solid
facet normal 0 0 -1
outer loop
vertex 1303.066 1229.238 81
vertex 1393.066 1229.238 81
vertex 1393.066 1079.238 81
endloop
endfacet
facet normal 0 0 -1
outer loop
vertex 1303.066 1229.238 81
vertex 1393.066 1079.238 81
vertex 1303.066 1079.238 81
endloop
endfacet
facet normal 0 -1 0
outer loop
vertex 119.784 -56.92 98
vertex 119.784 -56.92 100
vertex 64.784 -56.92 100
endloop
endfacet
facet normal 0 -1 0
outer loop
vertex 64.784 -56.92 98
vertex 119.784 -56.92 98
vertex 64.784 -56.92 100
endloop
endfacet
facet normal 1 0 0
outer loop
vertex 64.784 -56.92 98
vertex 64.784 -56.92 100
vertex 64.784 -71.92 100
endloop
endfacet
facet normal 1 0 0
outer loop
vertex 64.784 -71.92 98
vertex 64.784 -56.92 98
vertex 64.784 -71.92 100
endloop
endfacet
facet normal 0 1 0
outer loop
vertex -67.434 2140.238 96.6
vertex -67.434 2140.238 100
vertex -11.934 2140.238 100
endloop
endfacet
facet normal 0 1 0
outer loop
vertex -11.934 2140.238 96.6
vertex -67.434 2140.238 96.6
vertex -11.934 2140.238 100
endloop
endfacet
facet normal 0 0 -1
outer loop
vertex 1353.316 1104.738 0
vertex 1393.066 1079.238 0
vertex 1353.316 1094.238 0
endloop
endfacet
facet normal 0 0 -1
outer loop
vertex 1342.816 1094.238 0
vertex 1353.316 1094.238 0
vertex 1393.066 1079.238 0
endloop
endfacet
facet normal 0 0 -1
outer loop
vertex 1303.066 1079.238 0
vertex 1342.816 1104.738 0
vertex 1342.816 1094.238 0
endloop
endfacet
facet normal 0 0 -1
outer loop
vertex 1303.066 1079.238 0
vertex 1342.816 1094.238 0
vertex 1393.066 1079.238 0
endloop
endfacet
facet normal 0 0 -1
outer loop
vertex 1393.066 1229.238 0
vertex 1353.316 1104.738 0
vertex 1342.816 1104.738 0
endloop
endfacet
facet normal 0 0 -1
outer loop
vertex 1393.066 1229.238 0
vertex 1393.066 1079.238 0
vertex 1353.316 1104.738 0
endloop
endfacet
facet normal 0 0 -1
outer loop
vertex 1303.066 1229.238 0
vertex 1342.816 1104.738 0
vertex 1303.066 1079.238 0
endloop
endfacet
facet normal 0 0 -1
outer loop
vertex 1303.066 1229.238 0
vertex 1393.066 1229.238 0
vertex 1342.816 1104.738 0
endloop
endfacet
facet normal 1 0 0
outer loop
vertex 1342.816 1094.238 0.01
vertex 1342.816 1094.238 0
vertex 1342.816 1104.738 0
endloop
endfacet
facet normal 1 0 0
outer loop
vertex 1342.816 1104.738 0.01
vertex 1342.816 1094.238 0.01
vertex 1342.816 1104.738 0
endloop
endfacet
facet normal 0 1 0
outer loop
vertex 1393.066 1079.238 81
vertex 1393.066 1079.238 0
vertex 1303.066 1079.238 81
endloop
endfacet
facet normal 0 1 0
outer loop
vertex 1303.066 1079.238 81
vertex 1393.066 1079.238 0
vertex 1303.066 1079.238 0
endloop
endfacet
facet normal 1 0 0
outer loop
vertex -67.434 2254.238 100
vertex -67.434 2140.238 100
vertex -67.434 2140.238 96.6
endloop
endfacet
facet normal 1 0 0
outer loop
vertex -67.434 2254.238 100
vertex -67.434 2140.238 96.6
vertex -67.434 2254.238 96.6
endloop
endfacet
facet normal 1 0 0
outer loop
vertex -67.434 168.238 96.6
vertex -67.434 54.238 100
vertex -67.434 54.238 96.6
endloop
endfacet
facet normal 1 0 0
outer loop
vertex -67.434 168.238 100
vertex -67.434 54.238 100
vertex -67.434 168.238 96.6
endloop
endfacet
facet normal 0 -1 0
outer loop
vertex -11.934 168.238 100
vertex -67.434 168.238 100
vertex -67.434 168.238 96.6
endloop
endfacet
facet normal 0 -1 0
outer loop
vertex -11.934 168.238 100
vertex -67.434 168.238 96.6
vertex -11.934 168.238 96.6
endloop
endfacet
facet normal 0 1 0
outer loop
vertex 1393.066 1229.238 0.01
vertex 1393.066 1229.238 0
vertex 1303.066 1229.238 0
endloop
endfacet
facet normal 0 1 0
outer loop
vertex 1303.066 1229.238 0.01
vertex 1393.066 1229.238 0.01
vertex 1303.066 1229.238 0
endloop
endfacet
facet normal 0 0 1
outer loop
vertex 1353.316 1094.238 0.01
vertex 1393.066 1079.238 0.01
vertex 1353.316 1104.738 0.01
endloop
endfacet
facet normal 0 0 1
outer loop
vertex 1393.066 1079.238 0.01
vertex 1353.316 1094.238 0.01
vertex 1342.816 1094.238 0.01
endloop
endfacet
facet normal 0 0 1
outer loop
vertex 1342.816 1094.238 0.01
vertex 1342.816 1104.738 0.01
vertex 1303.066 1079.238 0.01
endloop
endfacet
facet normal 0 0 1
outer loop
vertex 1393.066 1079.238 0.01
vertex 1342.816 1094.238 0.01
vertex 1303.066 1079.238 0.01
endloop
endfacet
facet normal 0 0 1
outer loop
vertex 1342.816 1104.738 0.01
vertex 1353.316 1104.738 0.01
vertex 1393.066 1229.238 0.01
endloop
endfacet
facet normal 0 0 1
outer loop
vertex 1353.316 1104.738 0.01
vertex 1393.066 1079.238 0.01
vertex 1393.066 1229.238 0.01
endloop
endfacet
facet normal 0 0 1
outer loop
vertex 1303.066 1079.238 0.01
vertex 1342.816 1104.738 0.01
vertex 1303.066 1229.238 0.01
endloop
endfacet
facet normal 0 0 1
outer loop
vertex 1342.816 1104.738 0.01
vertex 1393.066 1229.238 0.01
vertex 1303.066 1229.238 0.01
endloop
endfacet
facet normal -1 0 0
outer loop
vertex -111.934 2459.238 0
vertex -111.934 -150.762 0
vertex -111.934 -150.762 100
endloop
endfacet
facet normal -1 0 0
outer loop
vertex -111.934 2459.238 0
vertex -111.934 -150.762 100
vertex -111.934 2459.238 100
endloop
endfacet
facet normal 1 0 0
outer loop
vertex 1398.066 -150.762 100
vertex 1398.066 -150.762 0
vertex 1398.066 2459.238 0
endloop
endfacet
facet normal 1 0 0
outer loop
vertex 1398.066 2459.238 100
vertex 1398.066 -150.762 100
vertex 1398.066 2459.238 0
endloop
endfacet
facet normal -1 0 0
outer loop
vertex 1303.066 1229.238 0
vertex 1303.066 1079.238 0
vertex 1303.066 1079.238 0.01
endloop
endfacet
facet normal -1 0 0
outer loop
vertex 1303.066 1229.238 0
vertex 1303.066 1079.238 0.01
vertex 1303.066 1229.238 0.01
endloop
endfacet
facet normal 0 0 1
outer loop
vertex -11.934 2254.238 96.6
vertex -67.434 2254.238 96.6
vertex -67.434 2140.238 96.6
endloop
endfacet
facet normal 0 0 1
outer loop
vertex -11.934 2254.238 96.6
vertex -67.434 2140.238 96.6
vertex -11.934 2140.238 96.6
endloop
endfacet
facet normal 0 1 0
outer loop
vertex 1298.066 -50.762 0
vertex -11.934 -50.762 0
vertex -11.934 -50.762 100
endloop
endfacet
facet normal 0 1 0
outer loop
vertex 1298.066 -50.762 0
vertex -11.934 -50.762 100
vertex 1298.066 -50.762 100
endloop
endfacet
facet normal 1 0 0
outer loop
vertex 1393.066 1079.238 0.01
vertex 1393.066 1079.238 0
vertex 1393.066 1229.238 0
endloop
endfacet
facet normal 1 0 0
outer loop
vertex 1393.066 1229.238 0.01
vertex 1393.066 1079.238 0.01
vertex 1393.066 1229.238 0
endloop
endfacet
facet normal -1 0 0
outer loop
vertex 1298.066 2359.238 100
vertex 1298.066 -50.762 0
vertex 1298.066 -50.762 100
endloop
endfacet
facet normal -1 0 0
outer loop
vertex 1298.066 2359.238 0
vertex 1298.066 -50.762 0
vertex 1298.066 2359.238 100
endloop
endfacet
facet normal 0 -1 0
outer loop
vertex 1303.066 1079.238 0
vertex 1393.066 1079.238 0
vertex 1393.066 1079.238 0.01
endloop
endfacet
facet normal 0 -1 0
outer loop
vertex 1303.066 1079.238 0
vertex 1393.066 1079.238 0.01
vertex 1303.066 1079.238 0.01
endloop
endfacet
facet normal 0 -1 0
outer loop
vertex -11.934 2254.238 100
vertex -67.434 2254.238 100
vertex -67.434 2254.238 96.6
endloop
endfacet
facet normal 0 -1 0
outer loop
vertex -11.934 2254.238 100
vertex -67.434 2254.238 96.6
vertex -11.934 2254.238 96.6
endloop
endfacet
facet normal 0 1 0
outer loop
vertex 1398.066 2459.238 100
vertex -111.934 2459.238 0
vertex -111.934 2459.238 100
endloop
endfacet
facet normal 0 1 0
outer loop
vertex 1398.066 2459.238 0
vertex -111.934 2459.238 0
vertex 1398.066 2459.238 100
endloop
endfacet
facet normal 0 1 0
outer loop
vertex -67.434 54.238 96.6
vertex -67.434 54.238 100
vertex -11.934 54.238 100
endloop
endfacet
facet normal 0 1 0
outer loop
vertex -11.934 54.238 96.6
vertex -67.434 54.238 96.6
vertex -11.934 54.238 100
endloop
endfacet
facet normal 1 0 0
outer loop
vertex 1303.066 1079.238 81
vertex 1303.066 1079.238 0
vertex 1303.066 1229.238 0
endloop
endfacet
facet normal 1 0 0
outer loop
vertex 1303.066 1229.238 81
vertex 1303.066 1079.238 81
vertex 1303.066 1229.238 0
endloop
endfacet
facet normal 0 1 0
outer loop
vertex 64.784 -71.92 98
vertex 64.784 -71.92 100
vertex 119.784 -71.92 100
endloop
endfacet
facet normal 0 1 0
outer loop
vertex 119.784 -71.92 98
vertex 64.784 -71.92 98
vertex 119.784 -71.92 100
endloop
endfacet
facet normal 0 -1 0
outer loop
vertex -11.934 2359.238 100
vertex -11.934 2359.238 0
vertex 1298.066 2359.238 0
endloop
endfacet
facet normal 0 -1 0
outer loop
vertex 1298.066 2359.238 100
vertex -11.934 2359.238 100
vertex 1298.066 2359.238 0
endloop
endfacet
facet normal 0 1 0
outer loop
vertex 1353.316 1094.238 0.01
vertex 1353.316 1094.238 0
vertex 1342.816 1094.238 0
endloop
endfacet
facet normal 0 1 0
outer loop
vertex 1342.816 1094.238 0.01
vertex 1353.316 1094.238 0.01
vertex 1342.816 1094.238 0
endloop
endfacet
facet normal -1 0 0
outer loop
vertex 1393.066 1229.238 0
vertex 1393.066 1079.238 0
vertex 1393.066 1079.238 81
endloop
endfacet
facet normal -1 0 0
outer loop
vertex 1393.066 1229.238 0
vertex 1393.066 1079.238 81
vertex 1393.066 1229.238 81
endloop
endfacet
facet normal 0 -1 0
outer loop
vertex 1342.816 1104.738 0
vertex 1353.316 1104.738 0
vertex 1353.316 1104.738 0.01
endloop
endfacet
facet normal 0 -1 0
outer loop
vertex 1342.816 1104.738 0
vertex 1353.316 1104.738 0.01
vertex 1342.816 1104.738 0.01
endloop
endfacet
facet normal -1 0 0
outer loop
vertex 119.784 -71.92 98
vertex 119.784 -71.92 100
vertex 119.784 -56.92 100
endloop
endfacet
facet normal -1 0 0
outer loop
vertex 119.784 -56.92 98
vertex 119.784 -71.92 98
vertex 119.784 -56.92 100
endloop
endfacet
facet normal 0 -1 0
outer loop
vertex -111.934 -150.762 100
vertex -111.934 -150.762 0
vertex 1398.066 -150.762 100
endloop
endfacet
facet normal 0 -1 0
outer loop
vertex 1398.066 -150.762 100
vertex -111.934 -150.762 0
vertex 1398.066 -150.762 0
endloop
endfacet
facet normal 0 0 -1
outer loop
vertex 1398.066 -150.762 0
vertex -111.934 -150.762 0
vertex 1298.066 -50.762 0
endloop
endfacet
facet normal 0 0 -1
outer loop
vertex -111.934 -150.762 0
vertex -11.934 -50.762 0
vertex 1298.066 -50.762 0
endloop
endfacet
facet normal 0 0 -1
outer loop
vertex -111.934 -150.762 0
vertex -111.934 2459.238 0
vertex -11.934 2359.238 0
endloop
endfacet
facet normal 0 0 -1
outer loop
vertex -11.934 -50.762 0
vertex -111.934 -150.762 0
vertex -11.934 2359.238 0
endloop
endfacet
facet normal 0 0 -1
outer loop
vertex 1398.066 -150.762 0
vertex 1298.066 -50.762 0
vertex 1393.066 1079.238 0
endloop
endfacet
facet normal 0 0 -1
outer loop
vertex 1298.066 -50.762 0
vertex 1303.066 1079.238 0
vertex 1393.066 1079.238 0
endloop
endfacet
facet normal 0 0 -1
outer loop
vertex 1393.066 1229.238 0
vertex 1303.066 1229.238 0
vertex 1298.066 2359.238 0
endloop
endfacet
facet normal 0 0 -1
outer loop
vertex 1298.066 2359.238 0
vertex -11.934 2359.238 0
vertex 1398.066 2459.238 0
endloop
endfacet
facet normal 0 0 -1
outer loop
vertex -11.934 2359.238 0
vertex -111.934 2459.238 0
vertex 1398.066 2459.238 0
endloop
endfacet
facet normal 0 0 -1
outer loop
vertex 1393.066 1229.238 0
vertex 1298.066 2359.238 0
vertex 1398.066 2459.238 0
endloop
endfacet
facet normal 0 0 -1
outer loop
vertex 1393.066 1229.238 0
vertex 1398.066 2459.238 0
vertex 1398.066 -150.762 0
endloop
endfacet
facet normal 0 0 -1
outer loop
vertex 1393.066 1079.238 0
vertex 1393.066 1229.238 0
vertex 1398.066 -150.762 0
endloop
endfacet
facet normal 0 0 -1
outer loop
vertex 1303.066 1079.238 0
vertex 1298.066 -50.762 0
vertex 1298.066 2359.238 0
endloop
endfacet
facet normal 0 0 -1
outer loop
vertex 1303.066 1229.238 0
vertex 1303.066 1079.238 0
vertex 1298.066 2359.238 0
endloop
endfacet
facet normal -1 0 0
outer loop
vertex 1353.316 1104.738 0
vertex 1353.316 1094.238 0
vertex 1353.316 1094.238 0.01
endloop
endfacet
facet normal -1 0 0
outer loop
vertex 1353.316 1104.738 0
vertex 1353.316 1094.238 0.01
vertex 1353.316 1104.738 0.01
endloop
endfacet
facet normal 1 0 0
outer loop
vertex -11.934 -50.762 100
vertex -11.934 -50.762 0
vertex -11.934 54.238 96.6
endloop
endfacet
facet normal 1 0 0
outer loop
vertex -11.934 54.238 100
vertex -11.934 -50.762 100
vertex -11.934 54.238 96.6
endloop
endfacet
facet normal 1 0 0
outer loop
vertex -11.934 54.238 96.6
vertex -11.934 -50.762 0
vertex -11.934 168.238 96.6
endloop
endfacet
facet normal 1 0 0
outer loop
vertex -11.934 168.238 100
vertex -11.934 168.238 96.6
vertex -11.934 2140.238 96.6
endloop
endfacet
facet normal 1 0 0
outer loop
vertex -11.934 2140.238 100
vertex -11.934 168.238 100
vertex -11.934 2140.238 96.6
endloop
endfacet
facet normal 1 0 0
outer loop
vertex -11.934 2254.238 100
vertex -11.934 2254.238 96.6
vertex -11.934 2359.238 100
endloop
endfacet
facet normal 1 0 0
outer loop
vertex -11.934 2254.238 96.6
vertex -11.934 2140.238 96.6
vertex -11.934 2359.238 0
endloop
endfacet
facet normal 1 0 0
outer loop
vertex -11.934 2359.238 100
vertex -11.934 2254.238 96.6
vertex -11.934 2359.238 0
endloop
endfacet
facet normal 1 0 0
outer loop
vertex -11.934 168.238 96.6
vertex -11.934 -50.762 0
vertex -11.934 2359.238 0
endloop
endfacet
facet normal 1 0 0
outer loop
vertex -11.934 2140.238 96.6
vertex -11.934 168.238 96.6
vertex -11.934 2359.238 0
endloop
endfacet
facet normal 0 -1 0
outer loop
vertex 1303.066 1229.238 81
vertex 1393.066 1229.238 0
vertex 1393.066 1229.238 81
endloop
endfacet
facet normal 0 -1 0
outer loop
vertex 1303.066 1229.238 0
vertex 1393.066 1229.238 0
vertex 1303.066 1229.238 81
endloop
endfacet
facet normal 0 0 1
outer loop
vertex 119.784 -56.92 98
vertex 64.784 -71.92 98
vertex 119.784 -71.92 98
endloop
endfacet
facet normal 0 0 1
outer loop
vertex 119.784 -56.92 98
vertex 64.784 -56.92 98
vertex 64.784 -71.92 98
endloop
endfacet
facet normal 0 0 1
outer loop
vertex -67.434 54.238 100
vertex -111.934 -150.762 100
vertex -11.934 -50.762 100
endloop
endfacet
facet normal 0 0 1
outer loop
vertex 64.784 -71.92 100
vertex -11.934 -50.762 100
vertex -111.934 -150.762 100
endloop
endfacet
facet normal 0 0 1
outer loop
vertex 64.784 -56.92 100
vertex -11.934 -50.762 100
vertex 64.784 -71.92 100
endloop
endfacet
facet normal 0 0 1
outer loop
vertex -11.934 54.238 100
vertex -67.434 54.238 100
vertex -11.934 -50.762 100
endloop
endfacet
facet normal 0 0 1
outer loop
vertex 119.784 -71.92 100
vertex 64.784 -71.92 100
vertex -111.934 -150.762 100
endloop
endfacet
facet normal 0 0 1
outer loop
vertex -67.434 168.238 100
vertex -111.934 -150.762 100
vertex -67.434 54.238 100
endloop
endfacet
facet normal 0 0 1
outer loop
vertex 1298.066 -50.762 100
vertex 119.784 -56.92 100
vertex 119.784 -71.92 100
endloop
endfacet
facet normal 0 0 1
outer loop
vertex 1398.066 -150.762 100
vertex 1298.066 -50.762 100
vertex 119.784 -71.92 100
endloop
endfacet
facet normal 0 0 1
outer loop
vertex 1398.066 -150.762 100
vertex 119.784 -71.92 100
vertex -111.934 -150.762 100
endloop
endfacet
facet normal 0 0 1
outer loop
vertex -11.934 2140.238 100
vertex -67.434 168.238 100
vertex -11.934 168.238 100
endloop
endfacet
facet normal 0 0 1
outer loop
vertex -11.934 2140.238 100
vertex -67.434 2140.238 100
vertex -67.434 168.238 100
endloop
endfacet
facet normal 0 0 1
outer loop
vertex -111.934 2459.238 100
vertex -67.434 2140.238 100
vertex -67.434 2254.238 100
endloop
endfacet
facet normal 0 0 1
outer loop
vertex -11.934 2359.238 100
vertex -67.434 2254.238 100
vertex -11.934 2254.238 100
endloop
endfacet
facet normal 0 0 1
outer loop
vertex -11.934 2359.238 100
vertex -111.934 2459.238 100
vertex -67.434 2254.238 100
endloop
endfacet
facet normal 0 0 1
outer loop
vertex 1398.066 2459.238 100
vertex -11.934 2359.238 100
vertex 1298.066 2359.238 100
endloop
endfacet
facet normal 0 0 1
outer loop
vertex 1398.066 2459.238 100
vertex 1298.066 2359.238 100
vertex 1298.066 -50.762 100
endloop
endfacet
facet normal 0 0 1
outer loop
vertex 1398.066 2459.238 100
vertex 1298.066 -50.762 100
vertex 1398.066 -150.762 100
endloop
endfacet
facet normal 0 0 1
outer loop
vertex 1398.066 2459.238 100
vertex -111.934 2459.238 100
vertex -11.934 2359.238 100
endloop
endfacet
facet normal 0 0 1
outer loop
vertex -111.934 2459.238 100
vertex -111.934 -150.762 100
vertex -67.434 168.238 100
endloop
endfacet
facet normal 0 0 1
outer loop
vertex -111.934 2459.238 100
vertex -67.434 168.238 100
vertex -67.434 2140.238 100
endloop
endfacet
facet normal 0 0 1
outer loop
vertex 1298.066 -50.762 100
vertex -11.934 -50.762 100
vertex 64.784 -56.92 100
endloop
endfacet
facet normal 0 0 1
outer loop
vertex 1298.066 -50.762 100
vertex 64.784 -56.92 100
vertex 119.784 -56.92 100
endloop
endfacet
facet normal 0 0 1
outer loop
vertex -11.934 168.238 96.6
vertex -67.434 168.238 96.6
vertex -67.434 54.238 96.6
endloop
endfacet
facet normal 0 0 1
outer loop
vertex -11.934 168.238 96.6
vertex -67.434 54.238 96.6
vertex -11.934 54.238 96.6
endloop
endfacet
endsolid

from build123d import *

# Parameters (mm, degrees)
SKETCH1_W           = 1510
SKETCH1_H           = 2610
SKETCH1_W_2         = 1310
SKETCH1_H_2         = 2410
BOSS_EXTRUDE1_DEPTH = 100
SKETCH2_W           = 55.5
SKETCH2_H           = 114
CUT_EXTRUDE1_DEPTH  = 3.4
CUT_EXTRUDE2_DEPTH  = 2
SKETCH6_W           = 90
SKETCH6_H           = 150
CUT_EXTRUDE3_DEPTH  = 81
SKETCH8_W           = 90
SKETCH8_H           = 150
SKETCH8_W_2         = 10.5
SKETCH8_H_2         = 10.5
BOSS_EXTRUDE6_DEPTH = 0.01


with BuildPart() as part:
    # Sketch1 → Boss-Extrude1 (new body)
    with BuildSketch(Plane.XY):
        with Locations((643.066350711, 1154.238151659)):
            Rectangle(SKETCH1_W, SKETCH1_H)
        with Locations((643.066350711, 1154.238151659)):
            Rectangle(SKETCH1_W_2, SKETCH1_H_2, mode=Mode.SUBTRACT)
    extrude(amount=BOSS_EXTRUDE1_DEPTH)

    # Sketch2 → Cut-Extrude1 (cut)
    with BuildSketch(Plane.XY.offset(100)):
        with Locations((-39.683649289, 2197.238151659)):
            Rectangle(SKETCH2_W, SKETCH2_H)
        with Locations((-39.683649289, 111.238151659)):
            Rectangle(SKETCH2_W, SKETCH2_H)
    extrude(amount=-CUT_EXTRUDE1_DEPTH, mode=Mode.SUBTRACT)

    # Sketch4 → Cut-Extrude2 (cut)
    with BuildSketch(Plane.XY.offset(100)):
        Polygon((64.784090596, -64.419848341), (64.784090596, -71.919848341), (72.284090596, -71.919848341), (114.224510839, -71.919848341), (119.784090596, -71.919848341), (119.784090596, -56.919848341), (64.784090596, -56.919848341), align=None)
    extrude(amount=-CUT_EXTRUDE2_DEPTH, mode=Mode.SUBTRACT)

    # Sketch6 → Cut-Extrude3 (cut)
    with BuildSketch(Plane(origin=(0, 0, 0), x_dir=(-1, 0, 0), z_dir=(0, 0, -1))):
        with Locations((-1348.066350711, 1154.238151659)):
            Rectangle(SKETCH6_W, SKETCH6_H)
    extrude(amount=-CUT_EXTRUDE3_DEPTH, mode=Mode.SUBTRACT)


with BuildPart() as body_2:
    # Sketch8 → Boss-Extrude6 (new body)
    with BuildSketch(Plane(origin=(0, 0, 0), x_dir=(-1, 0, 0), z_dir=(0, 0, -1))):
        with Locations((-1348.066350711, 1154.238151659)):
            Rectangle(SKETCH8_W, SKETCH8_H)
        with Locations((-1348.066350711, 1099.488151659)):
            Rectangle(SKETCH8_W_2, SKETCH8_H_2, mode=Mode.SUBTRACT)
    extrude(amount=-BOSS_EXTRUDE6_DEPTH)


solid = Compound([part.part, body_2.part])
